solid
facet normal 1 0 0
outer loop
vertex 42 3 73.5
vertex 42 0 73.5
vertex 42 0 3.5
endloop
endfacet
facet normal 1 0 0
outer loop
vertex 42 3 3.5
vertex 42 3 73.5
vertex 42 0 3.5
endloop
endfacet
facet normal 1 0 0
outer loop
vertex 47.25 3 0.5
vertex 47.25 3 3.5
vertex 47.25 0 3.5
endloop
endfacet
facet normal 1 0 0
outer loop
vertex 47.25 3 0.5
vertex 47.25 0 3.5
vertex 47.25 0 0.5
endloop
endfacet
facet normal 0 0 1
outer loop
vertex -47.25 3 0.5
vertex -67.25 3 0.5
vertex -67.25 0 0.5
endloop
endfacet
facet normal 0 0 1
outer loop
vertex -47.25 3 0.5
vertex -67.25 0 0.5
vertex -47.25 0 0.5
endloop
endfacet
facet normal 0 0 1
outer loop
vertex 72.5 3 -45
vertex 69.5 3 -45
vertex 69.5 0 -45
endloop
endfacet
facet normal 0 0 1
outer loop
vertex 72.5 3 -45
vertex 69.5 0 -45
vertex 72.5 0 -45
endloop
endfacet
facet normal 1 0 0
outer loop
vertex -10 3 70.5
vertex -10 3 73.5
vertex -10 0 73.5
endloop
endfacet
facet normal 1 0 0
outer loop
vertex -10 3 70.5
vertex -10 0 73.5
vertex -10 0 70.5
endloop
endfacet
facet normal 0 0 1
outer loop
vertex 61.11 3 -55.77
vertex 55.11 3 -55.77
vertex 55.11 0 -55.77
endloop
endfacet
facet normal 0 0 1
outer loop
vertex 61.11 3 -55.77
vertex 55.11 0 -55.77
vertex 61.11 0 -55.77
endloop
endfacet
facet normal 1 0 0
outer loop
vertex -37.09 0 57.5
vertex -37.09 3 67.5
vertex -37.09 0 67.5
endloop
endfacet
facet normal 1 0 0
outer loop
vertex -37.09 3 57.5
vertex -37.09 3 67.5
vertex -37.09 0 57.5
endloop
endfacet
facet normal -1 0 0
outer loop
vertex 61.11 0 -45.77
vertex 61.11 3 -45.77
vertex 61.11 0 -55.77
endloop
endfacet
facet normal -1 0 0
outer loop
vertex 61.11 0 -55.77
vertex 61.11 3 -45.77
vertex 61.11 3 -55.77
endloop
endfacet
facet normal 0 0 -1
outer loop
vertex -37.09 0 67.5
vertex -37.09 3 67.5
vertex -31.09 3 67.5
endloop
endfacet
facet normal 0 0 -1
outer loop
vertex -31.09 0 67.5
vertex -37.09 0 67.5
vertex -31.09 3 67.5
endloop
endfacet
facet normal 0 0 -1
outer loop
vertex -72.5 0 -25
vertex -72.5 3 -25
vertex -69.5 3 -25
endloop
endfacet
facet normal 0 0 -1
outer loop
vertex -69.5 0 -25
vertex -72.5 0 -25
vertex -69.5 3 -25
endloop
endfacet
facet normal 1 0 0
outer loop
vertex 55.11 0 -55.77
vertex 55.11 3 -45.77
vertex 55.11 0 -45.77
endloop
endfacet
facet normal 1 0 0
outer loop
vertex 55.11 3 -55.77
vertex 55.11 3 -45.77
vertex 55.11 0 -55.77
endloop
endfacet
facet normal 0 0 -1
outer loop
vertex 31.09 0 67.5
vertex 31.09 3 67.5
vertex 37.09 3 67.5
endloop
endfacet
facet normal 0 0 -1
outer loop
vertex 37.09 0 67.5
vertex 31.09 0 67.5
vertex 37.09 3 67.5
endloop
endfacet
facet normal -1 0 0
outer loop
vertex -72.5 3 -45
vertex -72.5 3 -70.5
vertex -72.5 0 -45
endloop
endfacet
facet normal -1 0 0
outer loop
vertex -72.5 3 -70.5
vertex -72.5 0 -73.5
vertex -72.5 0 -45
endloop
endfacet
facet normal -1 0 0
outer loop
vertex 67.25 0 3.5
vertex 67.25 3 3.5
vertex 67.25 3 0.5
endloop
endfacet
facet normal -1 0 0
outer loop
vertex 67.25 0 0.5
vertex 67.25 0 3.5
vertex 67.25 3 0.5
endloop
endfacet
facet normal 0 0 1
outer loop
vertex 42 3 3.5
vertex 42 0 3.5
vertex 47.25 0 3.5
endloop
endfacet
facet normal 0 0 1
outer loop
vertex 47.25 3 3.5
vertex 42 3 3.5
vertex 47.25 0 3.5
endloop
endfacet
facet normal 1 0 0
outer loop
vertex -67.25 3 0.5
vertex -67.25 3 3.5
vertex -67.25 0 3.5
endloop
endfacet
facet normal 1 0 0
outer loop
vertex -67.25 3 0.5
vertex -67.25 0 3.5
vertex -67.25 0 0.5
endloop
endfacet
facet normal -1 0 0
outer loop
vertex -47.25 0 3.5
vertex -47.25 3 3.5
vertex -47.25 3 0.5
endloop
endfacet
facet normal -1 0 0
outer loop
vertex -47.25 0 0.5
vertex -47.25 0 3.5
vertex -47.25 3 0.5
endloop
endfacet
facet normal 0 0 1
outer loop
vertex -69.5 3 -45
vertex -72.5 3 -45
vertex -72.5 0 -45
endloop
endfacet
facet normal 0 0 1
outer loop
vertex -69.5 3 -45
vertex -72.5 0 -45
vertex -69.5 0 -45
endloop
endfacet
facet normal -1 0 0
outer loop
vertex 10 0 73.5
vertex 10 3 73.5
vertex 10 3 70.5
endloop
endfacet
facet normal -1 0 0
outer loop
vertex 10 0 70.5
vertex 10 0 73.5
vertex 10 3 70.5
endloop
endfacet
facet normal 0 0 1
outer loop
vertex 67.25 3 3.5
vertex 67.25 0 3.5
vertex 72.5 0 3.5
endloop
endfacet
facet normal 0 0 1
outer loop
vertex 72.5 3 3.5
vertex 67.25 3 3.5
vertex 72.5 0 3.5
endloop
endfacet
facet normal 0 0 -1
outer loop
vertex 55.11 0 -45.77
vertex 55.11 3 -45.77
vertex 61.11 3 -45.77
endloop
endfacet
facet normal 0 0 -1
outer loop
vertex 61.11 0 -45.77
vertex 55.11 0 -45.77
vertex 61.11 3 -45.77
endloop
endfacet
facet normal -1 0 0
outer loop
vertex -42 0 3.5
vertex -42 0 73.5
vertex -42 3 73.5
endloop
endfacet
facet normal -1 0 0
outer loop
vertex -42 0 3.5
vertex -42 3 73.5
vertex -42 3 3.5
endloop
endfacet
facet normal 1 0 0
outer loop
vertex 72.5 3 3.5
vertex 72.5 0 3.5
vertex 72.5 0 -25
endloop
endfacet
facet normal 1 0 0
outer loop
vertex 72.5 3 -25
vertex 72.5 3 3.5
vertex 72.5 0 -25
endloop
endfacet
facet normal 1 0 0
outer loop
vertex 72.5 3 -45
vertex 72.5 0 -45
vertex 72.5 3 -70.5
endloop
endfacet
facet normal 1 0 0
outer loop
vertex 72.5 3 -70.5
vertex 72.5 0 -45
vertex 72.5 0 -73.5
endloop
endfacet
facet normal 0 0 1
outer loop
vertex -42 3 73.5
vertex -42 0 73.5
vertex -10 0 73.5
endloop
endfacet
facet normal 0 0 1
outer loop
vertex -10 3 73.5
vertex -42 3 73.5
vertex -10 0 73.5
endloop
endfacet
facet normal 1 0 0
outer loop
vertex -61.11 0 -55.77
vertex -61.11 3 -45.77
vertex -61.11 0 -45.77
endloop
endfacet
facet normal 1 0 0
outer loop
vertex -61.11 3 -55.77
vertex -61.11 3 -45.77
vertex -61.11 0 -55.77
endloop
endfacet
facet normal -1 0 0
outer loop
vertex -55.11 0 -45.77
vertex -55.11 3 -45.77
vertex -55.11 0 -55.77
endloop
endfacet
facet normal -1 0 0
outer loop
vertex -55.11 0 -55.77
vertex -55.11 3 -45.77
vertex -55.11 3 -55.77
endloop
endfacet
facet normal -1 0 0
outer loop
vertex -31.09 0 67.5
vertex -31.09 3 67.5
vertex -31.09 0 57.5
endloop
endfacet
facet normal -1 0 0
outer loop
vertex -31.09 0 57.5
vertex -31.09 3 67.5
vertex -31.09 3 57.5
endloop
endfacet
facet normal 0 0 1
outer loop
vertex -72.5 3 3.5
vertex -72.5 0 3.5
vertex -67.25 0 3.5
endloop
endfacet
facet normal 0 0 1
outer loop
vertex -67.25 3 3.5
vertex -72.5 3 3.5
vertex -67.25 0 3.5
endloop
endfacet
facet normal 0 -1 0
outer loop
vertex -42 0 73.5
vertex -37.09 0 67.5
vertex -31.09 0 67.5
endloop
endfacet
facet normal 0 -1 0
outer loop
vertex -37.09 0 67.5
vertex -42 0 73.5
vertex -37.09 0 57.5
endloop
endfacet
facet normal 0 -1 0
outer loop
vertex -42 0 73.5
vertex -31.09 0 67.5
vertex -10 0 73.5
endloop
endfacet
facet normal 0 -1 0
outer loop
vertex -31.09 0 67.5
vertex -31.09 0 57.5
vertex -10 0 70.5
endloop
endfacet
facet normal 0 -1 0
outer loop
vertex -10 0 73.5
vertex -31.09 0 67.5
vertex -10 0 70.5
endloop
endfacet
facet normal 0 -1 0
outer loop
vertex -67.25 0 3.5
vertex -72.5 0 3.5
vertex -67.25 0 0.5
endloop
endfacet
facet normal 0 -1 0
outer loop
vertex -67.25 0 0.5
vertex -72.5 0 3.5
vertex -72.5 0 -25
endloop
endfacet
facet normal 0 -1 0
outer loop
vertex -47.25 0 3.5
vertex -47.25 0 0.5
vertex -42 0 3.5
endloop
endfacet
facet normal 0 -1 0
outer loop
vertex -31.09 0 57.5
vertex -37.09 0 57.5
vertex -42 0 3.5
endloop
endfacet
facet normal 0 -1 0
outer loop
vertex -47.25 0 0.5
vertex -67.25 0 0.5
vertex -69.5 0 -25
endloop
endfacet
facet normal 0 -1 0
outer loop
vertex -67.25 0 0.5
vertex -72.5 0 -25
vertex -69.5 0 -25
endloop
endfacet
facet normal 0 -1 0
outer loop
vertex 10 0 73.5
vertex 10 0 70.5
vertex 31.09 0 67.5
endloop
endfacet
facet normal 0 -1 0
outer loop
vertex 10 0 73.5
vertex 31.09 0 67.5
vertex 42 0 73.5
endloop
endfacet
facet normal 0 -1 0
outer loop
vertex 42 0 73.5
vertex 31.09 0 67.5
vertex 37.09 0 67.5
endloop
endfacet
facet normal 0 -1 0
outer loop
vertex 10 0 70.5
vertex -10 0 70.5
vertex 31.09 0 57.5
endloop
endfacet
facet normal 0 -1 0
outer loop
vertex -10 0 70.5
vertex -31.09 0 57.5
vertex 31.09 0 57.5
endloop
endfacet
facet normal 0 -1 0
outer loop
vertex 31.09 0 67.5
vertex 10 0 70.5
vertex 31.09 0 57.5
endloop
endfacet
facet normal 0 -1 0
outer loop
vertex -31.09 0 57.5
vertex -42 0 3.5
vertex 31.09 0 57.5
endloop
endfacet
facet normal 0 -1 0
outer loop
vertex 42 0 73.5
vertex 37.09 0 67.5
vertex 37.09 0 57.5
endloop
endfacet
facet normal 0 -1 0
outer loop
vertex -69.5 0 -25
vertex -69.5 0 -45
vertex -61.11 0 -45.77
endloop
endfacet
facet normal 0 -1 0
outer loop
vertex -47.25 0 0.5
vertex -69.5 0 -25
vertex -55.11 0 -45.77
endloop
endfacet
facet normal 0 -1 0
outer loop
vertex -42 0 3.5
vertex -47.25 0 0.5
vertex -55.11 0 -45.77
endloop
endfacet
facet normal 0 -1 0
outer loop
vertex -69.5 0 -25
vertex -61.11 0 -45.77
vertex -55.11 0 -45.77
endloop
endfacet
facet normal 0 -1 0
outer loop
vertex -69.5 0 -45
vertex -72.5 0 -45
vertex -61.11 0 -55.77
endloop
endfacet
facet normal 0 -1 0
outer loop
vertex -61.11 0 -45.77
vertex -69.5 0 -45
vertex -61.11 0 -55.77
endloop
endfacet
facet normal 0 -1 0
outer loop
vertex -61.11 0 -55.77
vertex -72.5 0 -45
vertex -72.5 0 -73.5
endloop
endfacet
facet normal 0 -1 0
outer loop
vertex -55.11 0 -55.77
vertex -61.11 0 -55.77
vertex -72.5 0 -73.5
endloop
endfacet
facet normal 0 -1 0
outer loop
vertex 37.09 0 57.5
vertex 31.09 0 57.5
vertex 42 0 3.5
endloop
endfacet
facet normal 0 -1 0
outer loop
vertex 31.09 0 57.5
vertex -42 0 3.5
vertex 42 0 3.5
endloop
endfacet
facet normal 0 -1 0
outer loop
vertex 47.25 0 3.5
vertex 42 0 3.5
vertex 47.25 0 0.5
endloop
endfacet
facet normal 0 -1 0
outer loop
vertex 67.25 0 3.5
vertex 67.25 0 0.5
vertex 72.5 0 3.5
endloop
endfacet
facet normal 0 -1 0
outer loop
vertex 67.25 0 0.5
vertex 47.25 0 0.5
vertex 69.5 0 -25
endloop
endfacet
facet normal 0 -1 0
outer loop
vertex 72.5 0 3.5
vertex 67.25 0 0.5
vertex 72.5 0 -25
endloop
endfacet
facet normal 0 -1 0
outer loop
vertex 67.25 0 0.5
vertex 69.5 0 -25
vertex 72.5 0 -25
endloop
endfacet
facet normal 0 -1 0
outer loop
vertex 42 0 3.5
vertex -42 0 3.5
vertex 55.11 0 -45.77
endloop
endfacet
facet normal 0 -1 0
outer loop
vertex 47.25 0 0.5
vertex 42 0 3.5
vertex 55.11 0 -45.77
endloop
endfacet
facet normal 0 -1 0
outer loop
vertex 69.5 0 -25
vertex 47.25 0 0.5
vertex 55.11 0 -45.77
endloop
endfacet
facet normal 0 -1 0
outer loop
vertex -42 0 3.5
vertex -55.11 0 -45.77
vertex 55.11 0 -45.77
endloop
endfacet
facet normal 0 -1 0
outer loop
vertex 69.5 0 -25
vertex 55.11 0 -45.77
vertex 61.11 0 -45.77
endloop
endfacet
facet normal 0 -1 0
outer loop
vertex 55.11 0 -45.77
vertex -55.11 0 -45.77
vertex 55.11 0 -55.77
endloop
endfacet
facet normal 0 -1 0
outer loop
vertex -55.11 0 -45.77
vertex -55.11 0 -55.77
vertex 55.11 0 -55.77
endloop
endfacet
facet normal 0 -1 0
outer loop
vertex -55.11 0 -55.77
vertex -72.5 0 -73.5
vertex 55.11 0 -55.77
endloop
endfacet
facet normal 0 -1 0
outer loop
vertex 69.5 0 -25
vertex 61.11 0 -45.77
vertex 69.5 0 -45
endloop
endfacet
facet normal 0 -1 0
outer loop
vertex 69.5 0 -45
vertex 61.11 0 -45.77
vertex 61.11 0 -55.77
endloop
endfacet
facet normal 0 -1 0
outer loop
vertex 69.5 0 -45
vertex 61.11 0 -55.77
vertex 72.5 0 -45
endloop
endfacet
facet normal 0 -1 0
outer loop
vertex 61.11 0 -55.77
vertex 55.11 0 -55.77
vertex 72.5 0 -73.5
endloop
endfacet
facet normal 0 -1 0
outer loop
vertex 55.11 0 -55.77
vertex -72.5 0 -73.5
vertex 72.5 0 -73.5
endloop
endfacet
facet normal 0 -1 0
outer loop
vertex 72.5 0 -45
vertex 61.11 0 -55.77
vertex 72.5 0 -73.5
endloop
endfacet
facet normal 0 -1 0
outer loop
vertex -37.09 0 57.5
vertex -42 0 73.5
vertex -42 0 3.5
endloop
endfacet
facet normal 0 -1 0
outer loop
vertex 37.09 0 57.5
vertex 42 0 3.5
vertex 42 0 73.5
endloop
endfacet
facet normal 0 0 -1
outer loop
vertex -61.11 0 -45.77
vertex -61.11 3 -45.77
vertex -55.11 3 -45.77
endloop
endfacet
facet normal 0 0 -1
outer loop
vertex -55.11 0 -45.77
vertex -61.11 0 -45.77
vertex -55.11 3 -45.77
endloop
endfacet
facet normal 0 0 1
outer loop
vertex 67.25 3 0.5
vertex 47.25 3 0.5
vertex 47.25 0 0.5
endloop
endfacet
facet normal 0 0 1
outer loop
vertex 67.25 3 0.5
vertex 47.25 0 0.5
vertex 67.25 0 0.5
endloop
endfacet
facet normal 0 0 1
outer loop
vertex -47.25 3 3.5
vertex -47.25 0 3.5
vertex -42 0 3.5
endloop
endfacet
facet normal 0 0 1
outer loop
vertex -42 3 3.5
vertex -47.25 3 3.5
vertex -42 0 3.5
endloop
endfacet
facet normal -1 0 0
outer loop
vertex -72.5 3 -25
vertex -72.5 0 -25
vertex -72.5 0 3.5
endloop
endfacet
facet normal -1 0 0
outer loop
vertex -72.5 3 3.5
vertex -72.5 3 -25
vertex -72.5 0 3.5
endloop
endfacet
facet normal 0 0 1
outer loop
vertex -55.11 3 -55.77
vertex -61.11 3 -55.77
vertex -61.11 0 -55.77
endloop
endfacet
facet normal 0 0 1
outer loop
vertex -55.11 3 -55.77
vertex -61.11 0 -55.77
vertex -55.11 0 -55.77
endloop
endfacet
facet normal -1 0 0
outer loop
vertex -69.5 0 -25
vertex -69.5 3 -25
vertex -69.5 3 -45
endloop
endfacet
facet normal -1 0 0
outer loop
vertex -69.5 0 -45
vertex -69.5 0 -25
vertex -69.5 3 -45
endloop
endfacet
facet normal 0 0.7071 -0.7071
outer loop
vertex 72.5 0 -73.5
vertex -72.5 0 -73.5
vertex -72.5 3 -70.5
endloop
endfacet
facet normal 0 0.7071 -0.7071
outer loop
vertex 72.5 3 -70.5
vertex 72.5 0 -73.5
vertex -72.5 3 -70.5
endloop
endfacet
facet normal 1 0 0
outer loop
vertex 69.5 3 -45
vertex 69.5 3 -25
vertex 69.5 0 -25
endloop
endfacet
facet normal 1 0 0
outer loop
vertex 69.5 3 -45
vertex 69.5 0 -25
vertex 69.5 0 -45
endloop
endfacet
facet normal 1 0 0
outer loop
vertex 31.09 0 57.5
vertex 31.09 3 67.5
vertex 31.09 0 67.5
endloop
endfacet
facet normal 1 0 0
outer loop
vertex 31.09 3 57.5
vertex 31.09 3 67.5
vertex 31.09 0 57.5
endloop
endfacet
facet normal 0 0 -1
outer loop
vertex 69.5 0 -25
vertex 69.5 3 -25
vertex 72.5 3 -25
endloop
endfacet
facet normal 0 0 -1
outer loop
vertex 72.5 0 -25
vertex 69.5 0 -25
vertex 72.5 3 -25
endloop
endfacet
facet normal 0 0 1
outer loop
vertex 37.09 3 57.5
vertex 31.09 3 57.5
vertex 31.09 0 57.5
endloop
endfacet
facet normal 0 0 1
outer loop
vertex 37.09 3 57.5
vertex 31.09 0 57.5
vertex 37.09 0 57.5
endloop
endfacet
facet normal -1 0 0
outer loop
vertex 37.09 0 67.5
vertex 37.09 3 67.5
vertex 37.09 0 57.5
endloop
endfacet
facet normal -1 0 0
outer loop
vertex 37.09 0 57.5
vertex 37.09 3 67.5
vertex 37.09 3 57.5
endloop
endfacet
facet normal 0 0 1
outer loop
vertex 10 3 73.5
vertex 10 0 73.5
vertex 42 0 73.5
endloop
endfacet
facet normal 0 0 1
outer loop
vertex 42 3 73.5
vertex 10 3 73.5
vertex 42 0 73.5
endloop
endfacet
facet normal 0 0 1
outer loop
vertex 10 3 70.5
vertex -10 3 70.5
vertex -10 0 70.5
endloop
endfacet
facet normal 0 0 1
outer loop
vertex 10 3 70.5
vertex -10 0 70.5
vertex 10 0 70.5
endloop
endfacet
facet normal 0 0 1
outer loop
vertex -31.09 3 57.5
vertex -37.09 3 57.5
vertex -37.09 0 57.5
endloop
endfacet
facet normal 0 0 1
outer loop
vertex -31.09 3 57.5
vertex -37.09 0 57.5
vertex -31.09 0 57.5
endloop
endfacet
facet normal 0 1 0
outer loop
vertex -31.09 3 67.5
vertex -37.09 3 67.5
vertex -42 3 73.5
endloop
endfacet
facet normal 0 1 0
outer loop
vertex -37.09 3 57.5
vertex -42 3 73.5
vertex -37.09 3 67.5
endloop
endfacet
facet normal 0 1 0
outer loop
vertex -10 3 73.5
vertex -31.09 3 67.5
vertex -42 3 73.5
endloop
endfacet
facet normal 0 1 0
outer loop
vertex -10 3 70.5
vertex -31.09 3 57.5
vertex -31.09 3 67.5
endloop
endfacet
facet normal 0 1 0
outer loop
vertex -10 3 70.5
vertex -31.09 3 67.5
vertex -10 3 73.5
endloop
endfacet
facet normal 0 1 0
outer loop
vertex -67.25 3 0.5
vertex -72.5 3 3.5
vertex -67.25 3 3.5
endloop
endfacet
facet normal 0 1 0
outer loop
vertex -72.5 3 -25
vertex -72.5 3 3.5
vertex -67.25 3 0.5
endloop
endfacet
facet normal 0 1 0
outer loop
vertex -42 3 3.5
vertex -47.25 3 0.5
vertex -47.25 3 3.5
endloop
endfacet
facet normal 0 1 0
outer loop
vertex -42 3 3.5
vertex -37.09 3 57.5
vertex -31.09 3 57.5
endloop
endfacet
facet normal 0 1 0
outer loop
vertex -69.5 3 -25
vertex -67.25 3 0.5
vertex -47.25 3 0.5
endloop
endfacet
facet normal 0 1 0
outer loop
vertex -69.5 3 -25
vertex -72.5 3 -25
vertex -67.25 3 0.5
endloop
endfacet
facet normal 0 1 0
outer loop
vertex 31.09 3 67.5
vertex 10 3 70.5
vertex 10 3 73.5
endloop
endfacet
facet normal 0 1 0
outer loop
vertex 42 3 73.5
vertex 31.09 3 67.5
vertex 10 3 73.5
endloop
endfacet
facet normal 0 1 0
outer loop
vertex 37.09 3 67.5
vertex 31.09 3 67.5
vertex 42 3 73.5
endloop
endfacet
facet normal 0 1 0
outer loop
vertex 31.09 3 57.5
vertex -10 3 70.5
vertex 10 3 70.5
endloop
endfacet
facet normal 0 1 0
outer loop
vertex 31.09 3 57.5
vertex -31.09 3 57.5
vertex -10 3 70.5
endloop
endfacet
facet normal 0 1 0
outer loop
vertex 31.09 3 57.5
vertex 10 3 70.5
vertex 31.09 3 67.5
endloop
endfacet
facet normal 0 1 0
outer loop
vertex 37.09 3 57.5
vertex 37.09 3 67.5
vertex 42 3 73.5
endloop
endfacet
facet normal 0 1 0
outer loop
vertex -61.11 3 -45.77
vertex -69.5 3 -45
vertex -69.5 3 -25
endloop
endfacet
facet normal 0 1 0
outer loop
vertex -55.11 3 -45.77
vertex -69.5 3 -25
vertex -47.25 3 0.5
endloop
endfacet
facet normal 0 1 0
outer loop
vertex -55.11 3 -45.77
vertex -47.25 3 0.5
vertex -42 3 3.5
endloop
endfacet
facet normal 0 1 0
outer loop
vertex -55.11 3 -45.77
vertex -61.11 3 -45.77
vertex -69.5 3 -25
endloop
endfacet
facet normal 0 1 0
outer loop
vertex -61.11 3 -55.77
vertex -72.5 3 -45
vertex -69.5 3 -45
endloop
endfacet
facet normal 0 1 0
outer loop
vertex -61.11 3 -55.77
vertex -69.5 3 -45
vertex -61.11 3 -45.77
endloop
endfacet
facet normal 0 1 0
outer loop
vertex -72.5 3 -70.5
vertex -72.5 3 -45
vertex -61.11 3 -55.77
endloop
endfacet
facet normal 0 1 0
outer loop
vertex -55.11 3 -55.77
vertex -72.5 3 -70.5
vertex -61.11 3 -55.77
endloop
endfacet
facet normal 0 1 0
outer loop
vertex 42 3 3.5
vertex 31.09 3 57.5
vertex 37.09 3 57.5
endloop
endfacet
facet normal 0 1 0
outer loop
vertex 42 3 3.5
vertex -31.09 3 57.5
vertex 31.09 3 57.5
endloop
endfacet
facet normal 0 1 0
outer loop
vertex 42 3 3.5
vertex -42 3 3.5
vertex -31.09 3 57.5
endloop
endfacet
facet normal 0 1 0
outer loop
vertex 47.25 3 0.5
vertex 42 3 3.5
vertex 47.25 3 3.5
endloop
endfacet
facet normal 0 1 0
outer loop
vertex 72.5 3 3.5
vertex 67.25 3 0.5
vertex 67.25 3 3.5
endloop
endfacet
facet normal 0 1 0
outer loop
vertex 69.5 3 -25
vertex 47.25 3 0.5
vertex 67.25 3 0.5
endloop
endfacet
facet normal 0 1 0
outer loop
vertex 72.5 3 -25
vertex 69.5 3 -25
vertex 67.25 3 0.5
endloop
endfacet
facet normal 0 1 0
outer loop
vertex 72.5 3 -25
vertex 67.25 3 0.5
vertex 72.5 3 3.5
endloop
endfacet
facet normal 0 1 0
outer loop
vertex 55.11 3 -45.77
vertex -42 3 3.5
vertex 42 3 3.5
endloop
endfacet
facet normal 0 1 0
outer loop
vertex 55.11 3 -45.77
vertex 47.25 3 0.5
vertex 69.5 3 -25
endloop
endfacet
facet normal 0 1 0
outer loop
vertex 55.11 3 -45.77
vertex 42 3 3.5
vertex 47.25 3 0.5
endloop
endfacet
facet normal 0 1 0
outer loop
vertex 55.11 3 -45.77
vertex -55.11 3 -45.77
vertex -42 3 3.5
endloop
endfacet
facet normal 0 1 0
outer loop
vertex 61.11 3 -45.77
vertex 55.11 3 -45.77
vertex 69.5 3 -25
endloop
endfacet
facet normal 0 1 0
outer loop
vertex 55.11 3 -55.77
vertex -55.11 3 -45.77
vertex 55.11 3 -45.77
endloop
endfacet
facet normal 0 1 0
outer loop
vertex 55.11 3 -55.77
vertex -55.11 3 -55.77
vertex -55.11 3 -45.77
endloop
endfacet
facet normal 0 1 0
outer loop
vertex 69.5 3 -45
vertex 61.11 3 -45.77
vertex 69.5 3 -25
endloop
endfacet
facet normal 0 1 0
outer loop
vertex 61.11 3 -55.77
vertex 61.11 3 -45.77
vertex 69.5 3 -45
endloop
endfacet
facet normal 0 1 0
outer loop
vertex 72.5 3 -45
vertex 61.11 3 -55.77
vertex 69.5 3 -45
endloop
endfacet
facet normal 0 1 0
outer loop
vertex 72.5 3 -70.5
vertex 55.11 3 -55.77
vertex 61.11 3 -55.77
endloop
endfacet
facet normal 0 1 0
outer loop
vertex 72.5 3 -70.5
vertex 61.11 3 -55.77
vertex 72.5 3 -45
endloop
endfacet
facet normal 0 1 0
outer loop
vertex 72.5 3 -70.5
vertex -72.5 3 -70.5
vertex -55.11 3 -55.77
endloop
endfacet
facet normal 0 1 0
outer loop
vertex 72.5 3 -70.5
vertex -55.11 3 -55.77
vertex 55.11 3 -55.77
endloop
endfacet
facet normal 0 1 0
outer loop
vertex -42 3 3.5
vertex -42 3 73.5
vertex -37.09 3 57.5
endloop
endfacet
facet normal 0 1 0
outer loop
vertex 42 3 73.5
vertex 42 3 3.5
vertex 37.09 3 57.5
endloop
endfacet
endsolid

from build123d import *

# Parameters (mm, degrees)
CROQUIS1_W              = 84
CROQUIS1_H              = 70
SALIENTE_EXTRUIR1_DEPTH = 3
CROQUIS2_W              = 6
CROQUIS2_H              = 10
CORTAR_EXTRUIR1_DEPTH   = 3
CROQUIS3_W              = 20
CROQUIS3_H              = 3
CROQUIS3_W_2            = 3
CROQUIS3_H_2            = 20
CORTAR_EXTRUIR2_DEPTH   = 3
CORTAR_EXTRUIR3_DEPTH   = 146


with BuildPart() as part:
    # Croquis1 → Saliente-Extruir1 (new body)
    with BuildSketch(Plane(origin=(0, 0, 0), x_dir=(1, 0, 0), z_dir=(0, 1, 0))):
        Polygon((72.5, 73.5), (-72.5, 73.5), (-72.5, -3.5), (-42, -3.5), (42, -3.5), (72.5, -3.5), align=None)
        with Locations((0, -38.5)):
            Rectangle(CROQUIS1_W, CROQUIS1_H)
    extrude(amount=SALIENTE_EXTRUIR1_DEPTH)

    # Croquis2 → Cortar-Extruir1 (cut)
    with BuildSketch(Plane(origin=(0, 3, 0), x_dir=(1, 0, 0), z_dir=(0, 1, 0))):
        with Locations((-34.09, -62.5)):
            Rectangle(CROQUIS2_W, CROQUIS2_H)
        with Locations((34.09, -62.5)):
            Rectangle(CROQUIS2_W, CROQUIS2_H)
        with Locations((-58.11, 50.77)):
            Rectangle(CROQUIS2_W, CROQUIS2_H)
        with Locations((58.11, 50.77)):
            Rectangle(CROQUIS2_W, CROQUIS2_H)
    extrude(amount=-CORTAR_EXTRUIR1_DEPTH, mode=Mode.SUBTRACT)

    # Croquis3 → Cortar-Extruir2 (cut)
    with BuildSketch(Plane(origin=(0, 3, 0), x_dir=(1, 0, 0), z_dir=(0, 1, 0))):
        with Locations((0, -72)):
            Rectangle(CROQUIS3_W, CROQUIS3_H)
        with Locations((71, 35)):
            Rectangle(CROQUIS3_W_2, CROQUIS3_H_2)
        with Locations((-71, 35)):
            Rectangle(CROQUIS3_W_2, CROQUIS3_H_2)
        with Locations((57.25, -2)):
            Rectangle(CROQUIS3_W, CROQUIS3_H)
        with Locations((-57.25, -2)):
            Rectangle(CROQUIS3_W, CROQUIS3_H)
    extrude(amount=-CORTAR_EXTRUIR2_DEPTH, mode=Mode.SUBTRACT)

    # Croquis5 → Cortar-Extruir3 (cut, through all)
    with BuildSketch(Plane(origin=(72.5, 0, 0), x_dir=(0, 0, -1), z_dir=(1, 0, 0))):
        Polygon((73.5, 0), (70.5, 3), (73.5, 3), align=None)
    extrude(amount=-CORTAR_EXTRUIR3_DEPTH, mode=Mode.SUBTRACT)


solid = part.part
